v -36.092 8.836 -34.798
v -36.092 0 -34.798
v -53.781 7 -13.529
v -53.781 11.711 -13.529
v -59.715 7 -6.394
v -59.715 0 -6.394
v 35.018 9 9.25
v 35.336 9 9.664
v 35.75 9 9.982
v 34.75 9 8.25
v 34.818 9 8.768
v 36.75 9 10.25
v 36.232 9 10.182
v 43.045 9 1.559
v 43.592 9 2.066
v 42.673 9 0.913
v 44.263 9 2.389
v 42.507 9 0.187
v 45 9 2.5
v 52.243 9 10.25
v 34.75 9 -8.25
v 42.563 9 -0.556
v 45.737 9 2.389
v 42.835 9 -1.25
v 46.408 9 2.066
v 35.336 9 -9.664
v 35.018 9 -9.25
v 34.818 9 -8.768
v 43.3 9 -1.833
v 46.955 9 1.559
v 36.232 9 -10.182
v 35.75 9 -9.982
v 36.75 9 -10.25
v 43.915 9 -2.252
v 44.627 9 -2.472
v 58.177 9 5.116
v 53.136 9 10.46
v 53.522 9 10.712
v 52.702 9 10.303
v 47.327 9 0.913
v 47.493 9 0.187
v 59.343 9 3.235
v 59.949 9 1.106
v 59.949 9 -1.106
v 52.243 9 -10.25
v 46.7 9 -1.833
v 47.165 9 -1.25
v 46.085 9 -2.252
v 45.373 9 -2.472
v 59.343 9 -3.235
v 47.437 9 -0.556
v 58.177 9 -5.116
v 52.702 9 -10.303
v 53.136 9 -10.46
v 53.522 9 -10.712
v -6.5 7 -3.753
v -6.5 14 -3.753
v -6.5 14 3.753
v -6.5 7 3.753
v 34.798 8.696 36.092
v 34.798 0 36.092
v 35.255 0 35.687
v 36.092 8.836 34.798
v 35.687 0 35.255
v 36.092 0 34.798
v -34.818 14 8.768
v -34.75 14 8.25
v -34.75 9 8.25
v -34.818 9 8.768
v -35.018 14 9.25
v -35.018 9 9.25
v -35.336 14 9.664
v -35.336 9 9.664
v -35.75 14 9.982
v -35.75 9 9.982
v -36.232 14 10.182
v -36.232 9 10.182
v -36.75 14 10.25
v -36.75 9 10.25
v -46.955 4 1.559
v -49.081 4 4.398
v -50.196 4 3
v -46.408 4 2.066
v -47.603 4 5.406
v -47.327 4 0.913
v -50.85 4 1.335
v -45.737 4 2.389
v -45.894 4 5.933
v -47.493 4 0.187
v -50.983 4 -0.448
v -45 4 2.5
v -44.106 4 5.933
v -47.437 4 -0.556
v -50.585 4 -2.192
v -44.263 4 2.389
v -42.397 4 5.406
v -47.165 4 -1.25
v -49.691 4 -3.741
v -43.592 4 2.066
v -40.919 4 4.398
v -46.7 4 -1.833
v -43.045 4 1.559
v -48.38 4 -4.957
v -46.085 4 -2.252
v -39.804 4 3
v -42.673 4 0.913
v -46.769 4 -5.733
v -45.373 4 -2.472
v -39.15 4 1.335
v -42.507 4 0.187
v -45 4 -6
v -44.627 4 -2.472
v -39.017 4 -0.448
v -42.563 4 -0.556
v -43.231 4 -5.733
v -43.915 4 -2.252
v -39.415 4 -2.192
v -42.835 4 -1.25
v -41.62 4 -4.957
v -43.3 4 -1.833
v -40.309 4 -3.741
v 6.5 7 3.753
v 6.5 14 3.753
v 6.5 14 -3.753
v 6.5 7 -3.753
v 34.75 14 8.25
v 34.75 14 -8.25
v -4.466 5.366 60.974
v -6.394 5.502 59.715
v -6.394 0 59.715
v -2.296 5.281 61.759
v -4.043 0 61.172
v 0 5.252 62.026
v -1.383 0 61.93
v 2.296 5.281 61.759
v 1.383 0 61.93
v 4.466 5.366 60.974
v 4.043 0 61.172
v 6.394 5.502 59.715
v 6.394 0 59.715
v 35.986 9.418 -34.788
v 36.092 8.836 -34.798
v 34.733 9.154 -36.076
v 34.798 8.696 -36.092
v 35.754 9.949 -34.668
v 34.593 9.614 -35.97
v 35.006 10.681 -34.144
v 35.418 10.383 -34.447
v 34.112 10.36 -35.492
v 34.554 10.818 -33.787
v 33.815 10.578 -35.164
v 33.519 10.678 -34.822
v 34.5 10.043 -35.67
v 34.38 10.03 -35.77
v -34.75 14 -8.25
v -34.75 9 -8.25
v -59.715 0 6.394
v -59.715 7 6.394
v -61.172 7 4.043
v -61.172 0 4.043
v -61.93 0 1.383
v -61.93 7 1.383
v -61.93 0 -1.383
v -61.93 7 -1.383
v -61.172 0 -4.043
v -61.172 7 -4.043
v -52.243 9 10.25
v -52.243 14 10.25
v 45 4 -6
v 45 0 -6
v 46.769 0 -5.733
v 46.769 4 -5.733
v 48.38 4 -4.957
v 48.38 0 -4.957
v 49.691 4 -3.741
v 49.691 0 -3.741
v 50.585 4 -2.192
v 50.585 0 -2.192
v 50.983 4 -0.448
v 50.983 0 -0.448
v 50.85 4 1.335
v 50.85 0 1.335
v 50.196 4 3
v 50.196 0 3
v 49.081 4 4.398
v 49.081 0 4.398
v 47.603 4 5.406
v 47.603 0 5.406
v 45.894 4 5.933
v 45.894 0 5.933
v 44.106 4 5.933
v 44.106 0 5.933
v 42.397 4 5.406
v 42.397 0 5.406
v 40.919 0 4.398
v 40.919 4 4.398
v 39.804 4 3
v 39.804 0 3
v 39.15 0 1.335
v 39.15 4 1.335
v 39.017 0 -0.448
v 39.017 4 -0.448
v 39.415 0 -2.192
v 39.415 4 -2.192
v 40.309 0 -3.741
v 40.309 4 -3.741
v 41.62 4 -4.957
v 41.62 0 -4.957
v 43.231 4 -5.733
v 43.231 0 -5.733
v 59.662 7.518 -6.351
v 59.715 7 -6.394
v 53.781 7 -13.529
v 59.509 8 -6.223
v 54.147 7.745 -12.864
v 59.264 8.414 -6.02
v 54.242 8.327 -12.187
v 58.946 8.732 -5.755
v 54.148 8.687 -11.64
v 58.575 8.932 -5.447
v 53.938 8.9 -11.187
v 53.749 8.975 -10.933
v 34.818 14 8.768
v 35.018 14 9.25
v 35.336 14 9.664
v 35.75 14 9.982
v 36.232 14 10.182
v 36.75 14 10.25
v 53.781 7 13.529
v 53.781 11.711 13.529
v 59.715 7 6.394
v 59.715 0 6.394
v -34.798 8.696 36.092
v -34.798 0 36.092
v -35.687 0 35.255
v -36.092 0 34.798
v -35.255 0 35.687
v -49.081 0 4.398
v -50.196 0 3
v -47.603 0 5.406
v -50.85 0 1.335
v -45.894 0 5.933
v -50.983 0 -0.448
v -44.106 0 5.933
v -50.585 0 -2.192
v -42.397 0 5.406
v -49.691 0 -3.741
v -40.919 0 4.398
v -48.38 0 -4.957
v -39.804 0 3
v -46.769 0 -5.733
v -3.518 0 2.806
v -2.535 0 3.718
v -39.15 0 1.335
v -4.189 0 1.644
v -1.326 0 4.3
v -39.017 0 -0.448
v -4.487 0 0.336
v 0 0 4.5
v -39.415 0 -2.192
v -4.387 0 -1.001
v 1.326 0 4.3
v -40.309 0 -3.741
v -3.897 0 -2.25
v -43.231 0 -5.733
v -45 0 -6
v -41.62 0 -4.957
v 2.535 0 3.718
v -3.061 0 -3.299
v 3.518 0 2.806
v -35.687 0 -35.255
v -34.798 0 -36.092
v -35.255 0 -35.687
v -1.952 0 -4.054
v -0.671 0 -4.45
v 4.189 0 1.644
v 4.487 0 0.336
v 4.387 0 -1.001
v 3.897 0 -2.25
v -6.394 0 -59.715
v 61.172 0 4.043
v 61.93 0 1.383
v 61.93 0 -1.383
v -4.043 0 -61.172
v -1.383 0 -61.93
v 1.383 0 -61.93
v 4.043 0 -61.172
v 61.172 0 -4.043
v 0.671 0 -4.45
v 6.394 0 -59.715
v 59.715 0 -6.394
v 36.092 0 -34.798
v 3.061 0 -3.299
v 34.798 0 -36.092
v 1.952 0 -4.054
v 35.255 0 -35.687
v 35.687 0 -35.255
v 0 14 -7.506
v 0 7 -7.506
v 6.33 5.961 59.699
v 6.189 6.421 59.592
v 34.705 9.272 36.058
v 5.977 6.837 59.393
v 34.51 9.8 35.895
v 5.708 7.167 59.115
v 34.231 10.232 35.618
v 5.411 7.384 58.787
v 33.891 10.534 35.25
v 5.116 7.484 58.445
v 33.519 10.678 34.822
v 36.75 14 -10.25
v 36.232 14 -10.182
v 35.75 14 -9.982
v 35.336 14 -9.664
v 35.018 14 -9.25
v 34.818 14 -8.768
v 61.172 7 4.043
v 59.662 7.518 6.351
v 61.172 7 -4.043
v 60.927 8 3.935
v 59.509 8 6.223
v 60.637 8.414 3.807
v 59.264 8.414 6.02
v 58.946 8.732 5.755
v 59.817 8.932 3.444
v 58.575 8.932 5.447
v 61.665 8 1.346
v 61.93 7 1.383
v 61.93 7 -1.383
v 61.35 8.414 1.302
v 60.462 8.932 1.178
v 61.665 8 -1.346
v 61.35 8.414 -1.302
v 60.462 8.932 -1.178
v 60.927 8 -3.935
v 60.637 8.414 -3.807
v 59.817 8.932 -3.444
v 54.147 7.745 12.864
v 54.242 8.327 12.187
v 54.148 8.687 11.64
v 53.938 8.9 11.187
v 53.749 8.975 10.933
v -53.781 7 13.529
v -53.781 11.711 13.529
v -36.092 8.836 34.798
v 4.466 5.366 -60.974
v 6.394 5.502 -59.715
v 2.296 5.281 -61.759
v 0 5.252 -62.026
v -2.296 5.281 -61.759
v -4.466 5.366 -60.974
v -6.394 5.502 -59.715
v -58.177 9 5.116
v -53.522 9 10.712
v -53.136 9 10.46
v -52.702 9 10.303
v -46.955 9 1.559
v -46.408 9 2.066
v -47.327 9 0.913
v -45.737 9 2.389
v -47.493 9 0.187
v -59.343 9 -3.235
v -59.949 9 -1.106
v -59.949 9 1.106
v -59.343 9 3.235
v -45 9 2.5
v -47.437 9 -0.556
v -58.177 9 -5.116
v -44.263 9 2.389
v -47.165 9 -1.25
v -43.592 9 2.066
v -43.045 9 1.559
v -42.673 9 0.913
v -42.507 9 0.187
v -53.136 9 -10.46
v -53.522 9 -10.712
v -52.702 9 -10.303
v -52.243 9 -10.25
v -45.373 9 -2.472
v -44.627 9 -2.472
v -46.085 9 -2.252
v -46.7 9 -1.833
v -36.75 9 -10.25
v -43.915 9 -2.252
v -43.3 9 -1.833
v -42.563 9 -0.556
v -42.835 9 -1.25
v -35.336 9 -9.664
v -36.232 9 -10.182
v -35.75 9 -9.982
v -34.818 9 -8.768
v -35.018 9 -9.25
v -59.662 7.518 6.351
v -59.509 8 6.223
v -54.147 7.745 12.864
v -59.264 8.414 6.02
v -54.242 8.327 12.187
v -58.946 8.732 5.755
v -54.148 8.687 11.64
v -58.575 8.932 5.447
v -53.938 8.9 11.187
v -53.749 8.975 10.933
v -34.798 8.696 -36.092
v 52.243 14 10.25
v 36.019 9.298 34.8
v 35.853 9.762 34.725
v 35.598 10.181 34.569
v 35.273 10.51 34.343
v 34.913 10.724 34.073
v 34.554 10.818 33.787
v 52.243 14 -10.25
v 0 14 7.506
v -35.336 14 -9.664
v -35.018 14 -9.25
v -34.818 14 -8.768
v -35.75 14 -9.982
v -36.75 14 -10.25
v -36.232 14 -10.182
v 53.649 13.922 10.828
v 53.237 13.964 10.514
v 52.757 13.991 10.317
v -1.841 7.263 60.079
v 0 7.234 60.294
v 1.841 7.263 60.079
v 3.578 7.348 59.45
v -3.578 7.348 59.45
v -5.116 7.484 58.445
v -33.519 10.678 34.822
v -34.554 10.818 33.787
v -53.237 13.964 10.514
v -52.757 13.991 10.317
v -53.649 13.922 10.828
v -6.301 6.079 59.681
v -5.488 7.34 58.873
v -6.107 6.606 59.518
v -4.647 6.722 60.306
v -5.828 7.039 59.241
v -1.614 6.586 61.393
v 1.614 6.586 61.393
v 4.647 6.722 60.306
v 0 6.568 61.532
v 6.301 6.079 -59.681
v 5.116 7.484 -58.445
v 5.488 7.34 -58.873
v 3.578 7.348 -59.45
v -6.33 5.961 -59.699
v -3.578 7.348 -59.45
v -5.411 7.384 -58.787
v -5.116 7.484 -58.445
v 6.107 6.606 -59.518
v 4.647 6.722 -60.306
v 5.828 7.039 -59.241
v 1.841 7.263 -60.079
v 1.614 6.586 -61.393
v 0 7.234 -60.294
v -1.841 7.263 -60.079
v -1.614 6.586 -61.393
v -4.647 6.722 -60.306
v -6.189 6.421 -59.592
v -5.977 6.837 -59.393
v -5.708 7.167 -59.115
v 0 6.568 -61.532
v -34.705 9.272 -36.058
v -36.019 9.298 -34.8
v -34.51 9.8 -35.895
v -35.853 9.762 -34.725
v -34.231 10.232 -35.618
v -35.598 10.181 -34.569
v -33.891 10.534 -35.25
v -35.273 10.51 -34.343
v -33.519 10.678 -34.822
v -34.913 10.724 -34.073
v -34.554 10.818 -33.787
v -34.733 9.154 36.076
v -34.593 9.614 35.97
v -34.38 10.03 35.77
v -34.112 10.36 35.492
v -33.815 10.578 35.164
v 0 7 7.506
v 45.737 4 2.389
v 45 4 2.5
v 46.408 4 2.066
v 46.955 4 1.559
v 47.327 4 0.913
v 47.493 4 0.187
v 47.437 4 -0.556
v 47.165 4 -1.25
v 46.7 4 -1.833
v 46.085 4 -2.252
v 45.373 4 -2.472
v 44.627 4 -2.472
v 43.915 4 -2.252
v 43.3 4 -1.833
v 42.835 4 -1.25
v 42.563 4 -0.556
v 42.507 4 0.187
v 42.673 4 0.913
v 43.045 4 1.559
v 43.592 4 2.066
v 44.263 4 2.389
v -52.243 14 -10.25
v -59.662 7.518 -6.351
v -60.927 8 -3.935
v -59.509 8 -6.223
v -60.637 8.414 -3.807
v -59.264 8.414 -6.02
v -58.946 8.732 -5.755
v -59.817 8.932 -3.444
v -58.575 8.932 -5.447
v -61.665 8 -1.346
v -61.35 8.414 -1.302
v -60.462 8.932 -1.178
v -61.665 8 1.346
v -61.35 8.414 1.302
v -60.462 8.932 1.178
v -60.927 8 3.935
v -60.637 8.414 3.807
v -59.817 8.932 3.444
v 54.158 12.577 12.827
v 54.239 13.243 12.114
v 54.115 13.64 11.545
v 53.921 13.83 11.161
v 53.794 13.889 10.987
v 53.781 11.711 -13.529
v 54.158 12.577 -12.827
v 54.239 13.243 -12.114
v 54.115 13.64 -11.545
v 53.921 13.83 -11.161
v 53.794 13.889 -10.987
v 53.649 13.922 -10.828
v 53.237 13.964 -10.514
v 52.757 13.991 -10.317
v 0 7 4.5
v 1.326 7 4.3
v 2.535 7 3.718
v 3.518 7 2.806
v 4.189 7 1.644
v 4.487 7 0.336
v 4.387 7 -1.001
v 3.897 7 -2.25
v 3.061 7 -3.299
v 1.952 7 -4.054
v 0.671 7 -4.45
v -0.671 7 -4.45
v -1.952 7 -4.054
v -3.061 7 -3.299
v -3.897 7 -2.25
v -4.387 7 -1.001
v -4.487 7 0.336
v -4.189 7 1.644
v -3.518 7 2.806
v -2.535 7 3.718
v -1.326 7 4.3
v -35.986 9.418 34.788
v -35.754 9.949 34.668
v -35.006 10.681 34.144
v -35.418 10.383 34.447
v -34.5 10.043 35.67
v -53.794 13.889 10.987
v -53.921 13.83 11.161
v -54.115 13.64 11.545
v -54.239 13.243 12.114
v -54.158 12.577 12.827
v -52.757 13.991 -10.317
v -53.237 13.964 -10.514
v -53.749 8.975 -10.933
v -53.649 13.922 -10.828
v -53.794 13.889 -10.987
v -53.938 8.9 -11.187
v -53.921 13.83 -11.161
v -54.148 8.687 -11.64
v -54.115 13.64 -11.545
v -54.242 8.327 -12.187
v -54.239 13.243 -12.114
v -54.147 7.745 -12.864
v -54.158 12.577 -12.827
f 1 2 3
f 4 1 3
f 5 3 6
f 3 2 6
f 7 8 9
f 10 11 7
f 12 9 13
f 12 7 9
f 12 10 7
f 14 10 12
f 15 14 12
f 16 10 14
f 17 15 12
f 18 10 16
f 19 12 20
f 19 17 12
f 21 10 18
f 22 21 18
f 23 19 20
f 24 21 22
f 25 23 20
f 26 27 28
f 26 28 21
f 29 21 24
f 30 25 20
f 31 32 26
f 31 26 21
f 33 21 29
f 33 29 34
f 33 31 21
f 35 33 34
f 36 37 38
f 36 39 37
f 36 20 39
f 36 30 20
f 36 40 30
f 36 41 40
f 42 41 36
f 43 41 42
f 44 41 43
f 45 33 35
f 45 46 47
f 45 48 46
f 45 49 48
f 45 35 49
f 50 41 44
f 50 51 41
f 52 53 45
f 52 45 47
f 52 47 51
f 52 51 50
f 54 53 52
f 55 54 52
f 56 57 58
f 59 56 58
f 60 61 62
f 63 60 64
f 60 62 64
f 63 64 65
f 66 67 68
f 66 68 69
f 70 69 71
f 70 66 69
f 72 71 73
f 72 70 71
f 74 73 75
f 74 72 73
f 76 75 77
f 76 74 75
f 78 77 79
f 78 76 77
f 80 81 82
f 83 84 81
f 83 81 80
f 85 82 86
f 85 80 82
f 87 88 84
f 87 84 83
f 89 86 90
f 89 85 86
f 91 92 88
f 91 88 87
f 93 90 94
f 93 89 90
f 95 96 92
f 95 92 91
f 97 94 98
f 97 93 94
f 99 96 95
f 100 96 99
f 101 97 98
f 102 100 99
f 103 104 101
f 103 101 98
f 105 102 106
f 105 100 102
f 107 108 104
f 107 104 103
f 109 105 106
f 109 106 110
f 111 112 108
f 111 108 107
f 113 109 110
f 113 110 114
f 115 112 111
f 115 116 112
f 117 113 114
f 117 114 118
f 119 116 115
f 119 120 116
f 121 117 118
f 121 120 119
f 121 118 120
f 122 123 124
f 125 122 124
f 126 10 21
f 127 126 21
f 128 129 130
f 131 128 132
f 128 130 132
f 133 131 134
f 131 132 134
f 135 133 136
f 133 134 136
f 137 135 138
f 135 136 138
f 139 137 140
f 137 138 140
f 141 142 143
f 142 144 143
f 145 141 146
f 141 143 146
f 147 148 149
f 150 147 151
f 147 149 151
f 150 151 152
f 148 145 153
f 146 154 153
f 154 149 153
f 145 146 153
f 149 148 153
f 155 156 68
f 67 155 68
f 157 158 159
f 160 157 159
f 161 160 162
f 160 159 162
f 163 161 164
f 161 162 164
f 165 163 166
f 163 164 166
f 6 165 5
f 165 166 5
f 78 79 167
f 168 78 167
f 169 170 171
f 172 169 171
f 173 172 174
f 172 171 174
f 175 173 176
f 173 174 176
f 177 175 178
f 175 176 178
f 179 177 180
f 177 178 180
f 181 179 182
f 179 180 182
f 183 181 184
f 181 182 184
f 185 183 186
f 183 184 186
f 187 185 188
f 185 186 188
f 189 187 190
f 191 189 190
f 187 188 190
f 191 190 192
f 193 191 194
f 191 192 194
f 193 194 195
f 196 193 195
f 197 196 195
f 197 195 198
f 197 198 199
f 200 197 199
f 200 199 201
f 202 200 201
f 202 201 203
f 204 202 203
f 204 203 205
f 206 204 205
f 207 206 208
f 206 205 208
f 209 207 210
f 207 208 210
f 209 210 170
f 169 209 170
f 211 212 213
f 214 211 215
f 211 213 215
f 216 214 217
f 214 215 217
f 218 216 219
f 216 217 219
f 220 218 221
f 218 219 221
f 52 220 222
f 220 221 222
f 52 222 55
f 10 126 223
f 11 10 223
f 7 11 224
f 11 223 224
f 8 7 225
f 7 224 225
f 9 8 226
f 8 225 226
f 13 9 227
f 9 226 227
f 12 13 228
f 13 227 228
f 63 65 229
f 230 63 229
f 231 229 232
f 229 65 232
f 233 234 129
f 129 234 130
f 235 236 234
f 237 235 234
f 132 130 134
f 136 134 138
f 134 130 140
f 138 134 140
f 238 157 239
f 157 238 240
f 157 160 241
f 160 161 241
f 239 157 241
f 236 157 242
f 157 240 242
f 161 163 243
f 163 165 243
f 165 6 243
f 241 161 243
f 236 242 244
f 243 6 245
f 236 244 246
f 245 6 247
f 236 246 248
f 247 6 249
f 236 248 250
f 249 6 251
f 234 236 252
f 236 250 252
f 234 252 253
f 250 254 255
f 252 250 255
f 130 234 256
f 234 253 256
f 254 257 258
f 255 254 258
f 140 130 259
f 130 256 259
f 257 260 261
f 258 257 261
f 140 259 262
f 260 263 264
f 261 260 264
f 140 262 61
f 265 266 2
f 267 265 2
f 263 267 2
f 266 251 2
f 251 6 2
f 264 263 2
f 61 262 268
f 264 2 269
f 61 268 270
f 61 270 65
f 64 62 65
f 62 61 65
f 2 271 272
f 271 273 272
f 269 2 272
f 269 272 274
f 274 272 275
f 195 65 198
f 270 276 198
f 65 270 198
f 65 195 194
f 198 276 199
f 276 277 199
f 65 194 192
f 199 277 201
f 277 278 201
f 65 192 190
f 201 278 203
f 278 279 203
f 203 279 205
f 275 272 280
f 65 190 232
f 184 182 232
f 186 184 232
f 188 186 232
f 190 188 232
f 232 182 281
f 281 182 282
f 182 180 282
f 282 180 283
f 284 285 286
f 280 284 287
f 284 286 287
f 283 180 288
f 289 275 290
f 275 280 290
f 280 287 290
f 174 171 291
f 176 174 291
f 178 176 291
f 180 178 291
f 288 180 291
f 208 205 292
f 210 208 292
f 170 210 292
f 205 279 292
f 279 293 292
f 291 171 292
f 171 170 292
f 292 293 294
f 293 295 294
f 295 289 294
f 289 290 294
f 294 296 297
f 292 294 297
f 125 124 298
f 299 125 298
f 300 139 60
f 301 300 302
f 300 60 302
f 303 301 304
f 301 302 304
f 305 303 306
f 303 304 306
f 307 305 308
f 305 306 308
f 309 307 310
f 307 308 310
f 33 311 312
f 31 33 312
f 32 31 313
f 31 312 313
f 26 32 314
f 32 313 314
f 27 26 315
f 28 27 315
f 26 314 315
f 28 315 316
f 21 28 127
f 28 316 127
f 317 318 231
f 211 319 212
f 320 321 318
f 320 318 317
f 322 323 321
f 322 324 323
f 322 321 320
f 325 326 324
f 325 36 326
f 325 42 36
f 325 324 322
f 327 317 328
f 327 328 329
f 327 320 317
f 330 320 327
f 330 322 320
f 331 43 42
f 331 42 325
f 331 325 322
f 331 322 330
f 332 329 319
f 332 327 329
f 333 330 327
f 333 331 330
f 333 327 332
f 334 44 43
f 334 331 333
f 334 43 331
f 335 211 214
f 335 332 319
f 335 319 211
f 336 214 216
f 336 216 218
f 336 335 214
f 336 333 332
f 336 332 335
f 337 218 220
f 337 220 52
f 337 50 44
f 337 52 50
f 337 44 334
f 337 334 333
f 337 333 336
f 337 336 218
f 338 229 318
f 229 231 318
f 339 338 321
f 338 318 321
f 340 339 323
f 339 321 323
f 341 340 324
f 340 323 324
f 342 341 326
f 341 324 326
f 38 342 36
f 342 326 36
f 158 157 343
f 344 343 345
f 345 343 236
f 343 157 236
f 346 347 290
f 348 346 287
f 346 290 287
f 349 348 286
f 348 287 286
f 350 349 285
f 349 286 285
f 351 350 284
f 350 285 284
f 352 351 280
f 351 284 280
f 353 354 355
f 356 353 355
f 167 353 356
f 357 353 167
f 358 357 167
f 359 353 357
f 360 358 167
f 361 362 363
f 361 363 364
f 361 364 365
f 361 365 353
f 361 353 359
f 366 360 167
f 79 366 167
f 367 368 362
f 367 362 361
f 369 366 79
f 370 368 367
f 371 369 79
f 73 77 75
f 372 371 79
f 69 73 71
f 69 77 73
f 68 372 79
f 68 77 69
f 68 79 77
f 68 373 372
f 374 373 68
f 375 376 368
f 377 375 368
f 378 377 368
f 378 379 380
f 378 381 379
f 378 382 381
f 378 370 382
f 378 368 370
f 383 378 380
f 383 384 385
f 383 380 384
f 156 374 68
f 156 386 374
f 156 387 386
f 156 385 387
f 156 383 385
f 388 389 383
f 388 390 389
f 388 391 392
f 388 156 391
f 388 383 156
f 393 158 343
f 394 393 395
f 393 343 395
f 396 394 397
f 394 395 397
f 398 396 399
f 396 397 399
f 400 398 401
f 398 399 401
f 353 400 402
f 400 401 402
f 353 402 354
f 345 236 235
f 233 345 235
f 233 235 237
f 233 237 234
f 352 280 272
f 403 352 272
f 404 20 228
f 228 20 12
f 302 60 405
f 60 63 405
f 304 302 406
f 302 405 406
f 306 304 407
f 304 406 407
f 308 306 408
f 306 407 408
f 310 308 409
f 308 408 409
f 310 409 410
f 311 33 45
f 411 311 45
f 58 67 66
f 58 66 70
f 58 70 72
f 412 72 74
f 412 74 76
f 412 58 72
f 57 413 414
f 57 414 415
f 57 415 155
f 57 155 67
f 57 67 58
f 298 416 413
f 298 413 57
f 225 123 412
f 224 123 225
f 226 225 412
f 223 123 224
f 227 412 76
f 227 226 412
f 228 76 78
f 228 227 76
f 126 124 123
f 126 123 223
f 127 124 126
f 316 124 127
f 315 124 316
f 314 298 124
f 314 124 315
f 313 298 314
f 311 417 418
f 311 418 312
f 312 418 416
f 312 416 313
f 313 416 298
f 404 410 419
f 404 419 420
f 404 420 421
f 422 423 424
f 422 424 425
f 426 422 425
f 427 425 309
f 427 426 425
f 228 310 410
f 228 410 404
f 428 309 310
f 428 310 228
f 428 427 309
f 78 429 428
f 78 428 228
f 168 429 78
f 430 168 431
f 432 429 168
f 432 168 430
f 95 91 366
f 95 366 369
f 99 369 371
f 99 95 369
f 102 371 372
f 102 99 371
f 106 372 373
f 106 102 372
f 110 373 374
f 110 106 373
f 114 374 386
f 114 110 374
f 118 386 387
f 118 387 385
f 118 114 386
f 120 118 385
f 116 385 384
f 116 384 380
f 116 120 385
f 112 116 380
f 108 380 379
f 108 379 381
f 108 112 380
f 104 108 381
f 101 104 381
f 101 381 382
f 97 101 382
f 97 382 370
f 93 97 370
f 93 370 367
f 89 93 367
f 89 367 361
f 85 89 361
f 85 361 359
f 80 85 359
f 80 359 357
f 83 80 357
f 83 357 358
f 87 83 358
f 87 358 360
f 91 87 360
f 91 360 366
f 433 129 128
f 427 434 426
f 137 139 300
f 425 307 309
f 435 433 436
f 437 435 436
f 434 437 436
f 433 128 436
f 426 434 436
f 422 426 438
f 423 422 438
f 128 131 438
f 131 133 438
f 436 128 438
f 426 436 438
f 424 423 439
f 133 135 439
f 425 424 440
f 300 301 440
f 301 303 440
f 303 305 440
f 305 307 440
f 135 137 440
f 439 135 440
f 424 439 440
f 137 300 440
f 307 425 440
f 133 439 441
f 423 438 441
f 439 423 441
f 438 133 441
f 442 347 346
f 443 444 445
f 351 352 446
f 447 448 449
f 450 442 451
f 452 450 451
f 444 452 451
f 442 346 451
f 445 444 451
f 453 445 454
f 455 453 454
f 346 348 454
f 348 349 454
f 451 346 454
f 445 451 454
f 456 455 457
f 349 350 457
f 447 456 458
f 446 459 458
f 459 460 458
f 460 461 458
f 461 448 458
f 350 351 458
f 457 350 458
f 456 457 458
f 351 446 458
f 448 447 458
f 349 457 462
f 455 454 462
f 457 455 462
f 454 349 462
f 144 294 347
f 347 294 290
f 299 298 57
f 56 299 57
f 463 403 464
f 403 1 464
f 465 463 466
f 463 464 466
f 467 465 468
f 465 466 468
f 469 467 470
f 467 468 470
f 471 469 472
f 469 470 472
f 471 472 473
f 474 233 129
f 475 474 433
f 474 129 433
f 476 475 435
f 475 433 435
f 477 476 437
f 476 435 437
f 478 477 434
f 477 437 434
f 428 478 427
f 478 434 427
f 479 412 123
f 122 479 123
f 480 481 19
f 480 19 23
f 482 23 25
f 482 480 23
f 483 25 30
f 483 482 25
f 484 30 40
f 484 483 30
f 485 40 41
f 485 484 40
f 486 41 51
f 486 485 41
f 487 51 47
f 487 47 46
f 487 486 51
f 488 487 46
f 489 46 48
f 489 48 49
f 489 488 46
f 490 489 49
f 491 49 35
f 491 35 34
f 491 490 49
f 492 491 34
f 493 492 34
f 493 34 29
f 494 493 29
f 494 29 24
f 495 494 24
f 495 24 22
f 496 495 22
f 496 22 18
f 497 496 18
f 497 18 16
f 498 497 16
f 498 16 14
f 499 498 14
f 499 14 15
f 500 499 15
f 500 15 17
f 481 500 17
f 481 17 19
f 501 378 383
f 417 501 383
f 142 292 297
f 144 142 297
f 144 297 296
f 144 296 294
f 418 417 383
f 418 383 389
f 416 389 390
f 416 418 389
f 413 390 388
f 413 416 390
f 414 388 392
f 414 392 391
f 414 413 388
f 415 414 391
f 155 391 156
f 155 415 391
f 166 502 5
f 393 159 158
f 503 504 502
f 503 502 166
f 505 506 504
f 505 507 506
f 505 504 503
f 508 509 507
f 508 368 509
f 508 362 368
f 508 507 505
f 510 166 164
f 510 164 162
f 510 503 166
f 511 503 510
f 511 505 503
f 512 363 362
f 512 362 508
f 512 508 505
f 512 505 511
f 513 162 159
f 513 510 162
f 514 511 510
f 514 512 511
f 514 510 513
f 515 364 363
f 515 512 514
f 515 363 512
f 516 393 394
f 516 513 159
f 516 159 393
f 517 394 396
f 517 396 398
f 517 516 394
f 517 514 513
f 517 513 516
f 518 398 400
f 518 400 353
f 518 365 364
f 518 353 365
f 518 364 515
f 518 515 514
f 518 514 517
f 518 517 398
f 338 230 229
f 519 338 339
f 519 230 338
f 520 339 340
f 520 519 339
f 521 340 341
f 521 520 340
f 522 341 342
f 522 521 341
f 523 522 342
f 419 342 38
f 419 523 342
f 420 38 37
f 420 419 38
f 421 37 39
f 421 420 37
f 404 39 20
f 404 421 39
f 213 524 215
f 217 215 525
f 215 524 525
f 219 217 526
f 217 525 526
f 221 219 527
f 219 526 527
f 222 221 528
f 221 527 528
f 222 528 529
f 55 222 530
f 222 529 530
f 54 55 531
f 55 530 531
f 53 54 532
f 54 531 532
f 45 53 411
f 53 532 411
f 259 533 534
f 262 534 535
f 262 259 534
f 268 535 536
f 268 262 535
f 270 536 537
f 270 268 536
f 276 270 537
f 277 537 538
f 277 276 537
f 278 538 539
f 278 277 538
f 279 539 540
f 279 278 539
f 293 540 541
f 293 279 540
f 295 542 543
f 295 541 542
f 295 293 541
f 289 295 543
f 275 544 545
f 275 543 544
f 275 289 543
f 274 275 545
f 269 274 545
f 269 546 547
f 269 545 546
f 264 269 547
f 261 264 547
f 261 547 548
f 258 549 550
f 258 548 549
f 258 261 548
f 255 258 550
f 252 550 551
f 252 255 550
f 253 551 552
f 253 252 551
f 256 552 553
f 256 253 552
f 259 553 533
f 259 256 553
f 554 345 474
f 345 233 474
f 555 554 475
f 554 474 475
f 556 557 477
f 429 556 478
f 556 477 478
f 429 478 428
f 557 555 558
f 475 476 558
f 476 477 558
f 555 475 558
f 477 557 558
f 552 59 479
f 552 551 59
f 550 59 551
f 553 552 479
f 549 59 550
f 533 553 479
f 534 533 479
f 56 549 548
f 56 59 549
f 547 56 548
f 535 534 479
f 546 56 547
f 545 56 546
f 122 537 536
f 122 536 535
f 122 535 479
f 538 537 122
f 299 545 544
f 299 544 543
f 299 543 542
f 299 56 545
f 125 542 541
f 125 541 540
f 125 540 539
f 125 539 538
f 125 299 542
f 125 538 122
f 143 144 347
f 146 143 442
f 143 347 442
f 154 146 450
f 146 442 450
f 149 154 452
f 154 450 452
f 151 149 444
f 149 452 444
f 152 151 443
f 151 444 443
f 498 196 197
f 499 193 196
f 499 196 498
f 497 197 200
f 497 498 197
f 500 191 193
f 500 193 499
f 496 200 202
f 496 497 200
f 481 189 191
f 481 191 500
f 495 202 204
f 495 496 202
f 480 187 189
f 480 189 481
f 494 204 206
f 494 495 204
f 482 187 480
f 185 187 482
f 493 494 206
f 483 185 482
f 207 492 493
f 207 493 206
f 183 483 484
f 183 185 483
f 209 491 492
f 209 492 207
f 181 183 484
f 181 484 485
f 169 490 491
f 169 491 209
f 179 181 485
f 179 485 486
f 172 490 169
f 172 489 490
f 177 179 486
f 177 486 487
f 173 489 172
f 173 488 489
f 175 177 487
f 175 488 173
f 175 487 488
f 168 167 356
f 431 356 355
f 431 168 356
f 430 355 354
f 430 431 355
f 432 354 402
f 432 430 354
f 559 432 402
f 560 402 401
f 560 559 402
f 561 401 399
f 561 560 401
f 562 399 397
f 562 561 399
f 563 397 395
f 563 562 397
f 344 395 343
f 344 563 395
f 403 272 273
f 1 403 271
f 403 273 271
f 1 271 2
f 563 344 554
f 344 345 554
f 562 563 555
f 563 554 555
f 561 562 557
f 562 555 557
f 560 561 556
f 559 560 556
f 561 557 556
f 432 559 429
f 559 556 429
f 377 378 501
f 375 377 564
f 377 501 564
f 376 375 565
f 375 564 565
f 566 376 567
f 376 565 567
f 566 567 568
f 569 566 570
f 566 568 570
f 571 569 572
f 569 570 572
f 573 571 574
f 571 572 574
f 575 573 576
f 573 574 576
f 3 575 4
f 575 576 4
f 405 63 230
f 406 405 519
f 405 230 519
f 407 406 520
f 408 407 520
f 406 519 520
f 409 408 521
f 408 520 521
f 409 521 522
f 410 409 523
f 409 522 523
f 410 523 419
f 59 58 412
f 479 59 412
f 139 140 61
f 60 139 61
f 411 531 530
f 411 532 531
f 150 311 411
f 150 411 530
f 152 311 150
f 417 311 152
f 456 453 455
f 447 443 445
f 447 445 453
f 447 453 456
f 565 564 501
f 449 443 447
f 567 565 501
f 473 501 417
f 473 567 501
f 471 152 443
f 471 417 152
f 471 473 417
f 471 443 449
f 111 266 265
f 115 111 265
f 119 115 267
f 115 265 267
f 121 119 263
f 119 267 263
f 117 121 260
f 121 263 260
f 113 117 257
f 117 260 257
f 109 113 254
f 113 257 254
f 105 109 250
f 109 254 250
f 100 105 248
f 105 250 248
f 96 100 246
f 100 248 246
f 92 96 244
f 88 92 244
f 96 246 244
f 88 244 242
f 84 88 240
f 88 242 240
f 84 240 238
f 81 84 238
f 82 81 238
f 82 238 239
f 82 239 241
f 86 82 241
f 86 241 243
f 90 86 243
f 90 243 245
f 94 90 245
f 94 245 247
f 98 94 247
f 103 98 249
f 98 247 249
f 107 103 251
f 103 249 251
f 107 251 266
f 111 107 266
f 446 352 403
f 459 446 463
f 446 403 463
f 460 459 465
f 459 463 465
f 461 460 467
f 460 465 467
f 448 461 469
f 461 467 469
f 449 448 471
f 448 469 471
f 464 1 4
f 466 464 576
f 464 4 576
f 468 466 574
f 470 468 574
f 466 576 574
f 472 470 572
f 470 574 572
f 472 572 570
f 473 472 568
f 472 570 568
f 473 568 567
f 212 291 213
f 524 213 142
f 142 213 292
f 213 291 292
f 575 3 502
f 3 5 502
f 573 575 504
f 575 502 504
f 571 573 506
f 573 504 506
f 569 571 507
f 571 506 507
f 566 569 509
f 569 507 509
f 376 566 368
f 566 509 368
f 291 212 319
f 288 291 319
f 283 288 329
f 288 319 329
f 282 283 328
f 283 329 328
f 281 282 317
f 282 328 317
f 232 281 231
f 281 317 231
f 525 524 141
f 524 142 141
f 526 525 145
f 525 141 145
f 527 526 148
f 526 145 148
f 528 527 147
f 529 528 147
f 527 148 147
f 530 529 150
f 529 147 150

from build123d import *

# Parameters (mm, degrees)
ESQUISSE1_R                  = 4.5
ESQUISSE1_R_2                = 2.4999999999999947
ESQUISSE1_R_3                = 2.500000000000002
BOSS_EXTRU_1_DEPTH           = 9
ESQUISSE2_OUTSIDE_W          = 172.788
ESQUISSE2_OUTSIDE_H          = 199.11
ENL_V_MAT_EXTRU_1_DEPTH      = 103.10046824457444
CONG_1_R                     = 10
ESQUISSE3_R                  = 4.5
BOSS_EXTRU_2_DEPTH           = 5
ENL_V_MAT_EXTRU_2_DEPTH      = 7
ESQUISSE5_R                  = 6.000000000000003
ENL_V_MAT_EXTRU_3_DEPTH      = 4
ENL_V_MAT_EXTRU_5_DEPTH      = 116.79687329576521
ENL_V_MAT_EXTRU_5_DEPTH_BACK = 116.79687329576521
CONG_2_R                     = 2


with BuildPart() as part:
    # Esquisse1 → Boss.-Extru.1 (new body)
    with BuildSketch(Plane(origin=(0, 0, 0), x_dir=(1, 0, 0), z_dir=(0, 1, 0))):
        Polygon((-65.03288181544035, -1.1e-16), (1.14e-14, -78.19354128404926), (65.03288181544036, -2.2e-16), (-1.33e-15, 78.19354128404929), align=None)
        with Locations(Location((0, 0, 0), (0, 0, 270))):
            Circle(ESQUISSE1_R, mode=Mode.SUBTRACT)
        with Locations(Location((-45, 0, 0), (0, 0, 270))):
            Circle(ESQUISSE1_R_2, mode=Mode.SUBTRACT)
        with Locations(Location((45, 0, 0), (0, 0, 270))):
            Circle(ESQUISSE1_R_3, mode=Mode.SUBTRACT)
    extrude(amount=BOSS_EXTRU_1_DEPTH)

    # Esquisse2 outside → Enlèv. mat.-Extru.1 (cut, through all)
    with BuildSketch(Plane(origin=(0, 9, 0), x_dir=(1, 0, 0), z_dir=(0, 1, 0))):
        Rectangle(ESQUISSE2_OUTSIDE_W, ESQUISSE2_OUTSIDE_H)
        Polygon((3.05e-15, 65.03288181544038), (-78.1935412840493, 1.183e-14), (-1.388e-14, -65.03288181544033), (78.1935412840493, 1.69e-14), align=None, mode=Mode.SUBTRACT)
    extrude(amount=-ENL_V_MAT_EXTRU_1_DEPTH, mode=Mode.SUBTRACT)

    # Congé1
    cong_1_edges = [part.edges().sort_by_distance(p)[0] for p in [
        (35.50428209412193, 4.5, -35.50428209412183),
        (35.504282094121805, 4.5, 35.50428209412193),
        (-35.50428209412127, 4.5, 35.50428209412245),
        (-35.504282094121926, 4.5, -35.504282094121834),
        (3.05e-15, 4.5, -65.03288181544038),
        (-1.388e-14, 4.5, 65.03288181544033),
        (65.03288181544036, 4.5, 2.2e-16),
        (-65.03288181544035, 4.5, 1.1e-16),
    ]]
    fillet(cong_1_edges, radius=CONG_1_R)

    # Esquisse3 → Boss.-Extru.2 (add)
    with BuildSketch(Plane(origin=(0, 9, 0), x_dir=(1, 0, 0), z_dir=(0, 1, 0))):
        with BuildLine():
            Line((-56.50804680142313, 10.250000000000002), (-34.74999999999999, 10.25))
            Line((-34.74999999999999, 10.25), (-34.74999999999999, -10.25))
            Line((-34.74999999999999, -10.25), (-56.50804680142313, -10.25))
            Line((-56.50804680142313, -10.25), (-36.091843996032054, -34.79781569510337))
            ThreePointArc((-36.091843996032054, -34.79781569510337), (-35.47449348716292, -35.47449348716301), (-34.79781569510328, -36.091843996032146))
            Line((-34.79781569510328, -36.091843996032146), (-6.394390019805823, -59.71472377308688))
            ThreePointArc((-6.394390019805823, -59.71472377308688), (-2.16e-15, -62.026305452352254), (6.3943900198058135, -59.71472377308687))
            Line((6.3943900198058135, -59.71472377308687), (34.797815695103374, -36.09184399603205))
            ThreePointArc((34.797815695103374, -36.09184399603205), (35.47449348716302, -35.47449348716292), (36.09184399603216, -34.79781569510327))
            Line((36.09184399603216, -34.79781569510327), (56.50804680142313, -10.25))
            Line((56.50804680142313, -10.25), (34.74999999999999, -10.25))
            Line((34.74999999999999, -10.25), (34.74999999999999, 10.25))
            Line((34.74999999999999, 10.25), (56.50804680142313, 10.250000000000002))
            Line((56.50804680142313, 10.250000000000002), (36.09184399603206, 34.797815695103395))
            ThreePointArc((36.09184399603206, 34.797815695103395), (35.47449348716294, 35.47449348716303), (34.7978156951033, 36.09184399603216))
            Line((34.7978156951033, 36.09184399603216), (6.394390019805837, 59.71472377308691))
            ThreePointArc((6.394390019805837, 59.71472377308691), (5.05e-15, 62.02630545235231), (-6.394390019805832, 59.71472377308692))
            Line((-6.394390019805832, 59.71472377308692), (-34.797815695103225, 36.09184399603222))
            ThreePointArc((-34.797815695103225, 36.09184399603222), (-35.47449348716287, 35.47449348716309), (-36.091843996032004, 34.79781569510345))
            Line((-36.091843996032004, 34.79781569510345), (-56.50804680142313, 10.250000000000002))
        make_face()
        with Locations(Location((0, 0, 0), (0, 0, 270))):
            Circle(ESQUISSE3_R, mode=Mode.SUBTRACT)
    extrude(amount=BOSS_EXTRU_2_DEPTH)

    # Esquisse4 → Enlèv. mat.-Extru.2 (cut)
    with BuildSketch(Plane(origin=(0, 13.999999999999998, 0), x_dir=(1, 0, 0), z_dir=(0, 1, 0))):
        Polygon((6.500000000000003, 3.7527767497325644), (3.51e-15, 7.5055534994651305), (-6.499999999999996, 3.752776749732566), (-6.499999999999996, -3.752776749732568), (7.1e-15, -7.505553499465138), (6.499999999999999, -3.752776749732574), align=None)
    extrude(amount=-ENL_V_MAT_EXTRU_2_DEPTH, mode=Mode.SUBTRACT)

    # Esquisse5 → Enlèv. mat.-Extru.3 (cut)
    with BuildSketch(Plane.XZ):
        with Locations(Location((-45, 0, 0), (0, 0, 270))):
            Circle(ESQUISSE5_R)
        with Locations(Location((45, 0, 0), (0, 0, 270))):
            Circle(ESQUISSE5_R)
    extrude(amount=-ENL_V_MAT_EXTRU_3_DEPTH, mode=Mode.SUBTRACT)

    # Esquisse6 → Enlèv. mat.-Extru.5 (cut, two sides: drawn at the far end of the back side and taken through both)
    with BuildSketch(Plane(origin=(34.74999999999999, 0, 0), x_dir=(0, 0, -1), z_dir=(1, 0, 0)).offset(-ENL_V_MAT_EXTRU_5_DEPTH_BACK)):
        Polygon((-62.02630545235226, 6.999999999999998), (-10.25, 13.999999999999998), (10.25, 13.999999999999998), (62.02630545235227, 7.000000000000001), (62.026305452352254, 36.4147856499244), (-62.026305452352254, 36.4147856499244), align=None)
    extrude(amount=ENL_V_MAT_EXTRU_5_DEPTH + ENL_V_MAT_EXTRU_5_DEPTH_BACK, mode=Mode.SUBTRACT)

    # Congé2
    cong_2_edges = [part.edges().sort_by_distance(p)[0] for p in [
        (58.11138528725502, 9, 8.322195009902927),
        (-58.11138528725501, 9, -8.322195009902927),
        (56.50804680142313, 11.5, 10.25),
        (34.74999999999999, 11.5, 10.25),
        (34.74999999999999, 11.5, -10.25),
        (56.50804680142313, 11.5, -10.250000000000002),
        (-56.50804680142313, 11.5, -10.250000000000002),
        (-34.74999999999999, 11.5, -10.25),
        (-34.74999999999999, 11.5, 10.25),
        (-56.50804680142313, 11.5, 10.25),
        (-46.299945398727594, 12.340604757673788, -22.523907847551726),
        (46.2999453987276, 12.340604757673791, -22.523907847551705),
        (20.596102857454603, 8.909389828239629, -47.90328388455951),
        (3.4028602353834634, 7.0806828820281655, -61.429525231685666),
        (35.47476156274495, 10.589760967545045, -35.47422540141744),
        (-46.299945398727345, 12.340604757673752, 22.523907847551982),
        (46.29994539872759, 12.340604757673788, 22.523907847551698),
        (3.4028602353834314, 7.080682882028164, 61.429525231685645),
        (20.596102857454596, 8.909389828239629, 47.903283884559464),
        (35.4747615627448, 10.589760967545022, 35.47422540141758),
        (-20.596102857454614, 8.909389828239625, -47.903283884559514),
        (-35.47476156274494, 10.589760967545041, -35.47422540141746),
        (-35.47476156274429, 10.589760967544956, 35.474225401418074),
        (-20.59610285745456, 8.909389828239624, 47.90328388455953),
        (58.11138528725502, 9, -8.322195009902925),
        (-58.111385287255004, 9, 8.322195009902918),
        (-62.02630545235229, 9, 8.38e-15),
        (62.02630545235229, 9, -4.51e-15),
    ]]
    fillet(cong_2_edges, radius=CONG_2_R)


solid = part.part
